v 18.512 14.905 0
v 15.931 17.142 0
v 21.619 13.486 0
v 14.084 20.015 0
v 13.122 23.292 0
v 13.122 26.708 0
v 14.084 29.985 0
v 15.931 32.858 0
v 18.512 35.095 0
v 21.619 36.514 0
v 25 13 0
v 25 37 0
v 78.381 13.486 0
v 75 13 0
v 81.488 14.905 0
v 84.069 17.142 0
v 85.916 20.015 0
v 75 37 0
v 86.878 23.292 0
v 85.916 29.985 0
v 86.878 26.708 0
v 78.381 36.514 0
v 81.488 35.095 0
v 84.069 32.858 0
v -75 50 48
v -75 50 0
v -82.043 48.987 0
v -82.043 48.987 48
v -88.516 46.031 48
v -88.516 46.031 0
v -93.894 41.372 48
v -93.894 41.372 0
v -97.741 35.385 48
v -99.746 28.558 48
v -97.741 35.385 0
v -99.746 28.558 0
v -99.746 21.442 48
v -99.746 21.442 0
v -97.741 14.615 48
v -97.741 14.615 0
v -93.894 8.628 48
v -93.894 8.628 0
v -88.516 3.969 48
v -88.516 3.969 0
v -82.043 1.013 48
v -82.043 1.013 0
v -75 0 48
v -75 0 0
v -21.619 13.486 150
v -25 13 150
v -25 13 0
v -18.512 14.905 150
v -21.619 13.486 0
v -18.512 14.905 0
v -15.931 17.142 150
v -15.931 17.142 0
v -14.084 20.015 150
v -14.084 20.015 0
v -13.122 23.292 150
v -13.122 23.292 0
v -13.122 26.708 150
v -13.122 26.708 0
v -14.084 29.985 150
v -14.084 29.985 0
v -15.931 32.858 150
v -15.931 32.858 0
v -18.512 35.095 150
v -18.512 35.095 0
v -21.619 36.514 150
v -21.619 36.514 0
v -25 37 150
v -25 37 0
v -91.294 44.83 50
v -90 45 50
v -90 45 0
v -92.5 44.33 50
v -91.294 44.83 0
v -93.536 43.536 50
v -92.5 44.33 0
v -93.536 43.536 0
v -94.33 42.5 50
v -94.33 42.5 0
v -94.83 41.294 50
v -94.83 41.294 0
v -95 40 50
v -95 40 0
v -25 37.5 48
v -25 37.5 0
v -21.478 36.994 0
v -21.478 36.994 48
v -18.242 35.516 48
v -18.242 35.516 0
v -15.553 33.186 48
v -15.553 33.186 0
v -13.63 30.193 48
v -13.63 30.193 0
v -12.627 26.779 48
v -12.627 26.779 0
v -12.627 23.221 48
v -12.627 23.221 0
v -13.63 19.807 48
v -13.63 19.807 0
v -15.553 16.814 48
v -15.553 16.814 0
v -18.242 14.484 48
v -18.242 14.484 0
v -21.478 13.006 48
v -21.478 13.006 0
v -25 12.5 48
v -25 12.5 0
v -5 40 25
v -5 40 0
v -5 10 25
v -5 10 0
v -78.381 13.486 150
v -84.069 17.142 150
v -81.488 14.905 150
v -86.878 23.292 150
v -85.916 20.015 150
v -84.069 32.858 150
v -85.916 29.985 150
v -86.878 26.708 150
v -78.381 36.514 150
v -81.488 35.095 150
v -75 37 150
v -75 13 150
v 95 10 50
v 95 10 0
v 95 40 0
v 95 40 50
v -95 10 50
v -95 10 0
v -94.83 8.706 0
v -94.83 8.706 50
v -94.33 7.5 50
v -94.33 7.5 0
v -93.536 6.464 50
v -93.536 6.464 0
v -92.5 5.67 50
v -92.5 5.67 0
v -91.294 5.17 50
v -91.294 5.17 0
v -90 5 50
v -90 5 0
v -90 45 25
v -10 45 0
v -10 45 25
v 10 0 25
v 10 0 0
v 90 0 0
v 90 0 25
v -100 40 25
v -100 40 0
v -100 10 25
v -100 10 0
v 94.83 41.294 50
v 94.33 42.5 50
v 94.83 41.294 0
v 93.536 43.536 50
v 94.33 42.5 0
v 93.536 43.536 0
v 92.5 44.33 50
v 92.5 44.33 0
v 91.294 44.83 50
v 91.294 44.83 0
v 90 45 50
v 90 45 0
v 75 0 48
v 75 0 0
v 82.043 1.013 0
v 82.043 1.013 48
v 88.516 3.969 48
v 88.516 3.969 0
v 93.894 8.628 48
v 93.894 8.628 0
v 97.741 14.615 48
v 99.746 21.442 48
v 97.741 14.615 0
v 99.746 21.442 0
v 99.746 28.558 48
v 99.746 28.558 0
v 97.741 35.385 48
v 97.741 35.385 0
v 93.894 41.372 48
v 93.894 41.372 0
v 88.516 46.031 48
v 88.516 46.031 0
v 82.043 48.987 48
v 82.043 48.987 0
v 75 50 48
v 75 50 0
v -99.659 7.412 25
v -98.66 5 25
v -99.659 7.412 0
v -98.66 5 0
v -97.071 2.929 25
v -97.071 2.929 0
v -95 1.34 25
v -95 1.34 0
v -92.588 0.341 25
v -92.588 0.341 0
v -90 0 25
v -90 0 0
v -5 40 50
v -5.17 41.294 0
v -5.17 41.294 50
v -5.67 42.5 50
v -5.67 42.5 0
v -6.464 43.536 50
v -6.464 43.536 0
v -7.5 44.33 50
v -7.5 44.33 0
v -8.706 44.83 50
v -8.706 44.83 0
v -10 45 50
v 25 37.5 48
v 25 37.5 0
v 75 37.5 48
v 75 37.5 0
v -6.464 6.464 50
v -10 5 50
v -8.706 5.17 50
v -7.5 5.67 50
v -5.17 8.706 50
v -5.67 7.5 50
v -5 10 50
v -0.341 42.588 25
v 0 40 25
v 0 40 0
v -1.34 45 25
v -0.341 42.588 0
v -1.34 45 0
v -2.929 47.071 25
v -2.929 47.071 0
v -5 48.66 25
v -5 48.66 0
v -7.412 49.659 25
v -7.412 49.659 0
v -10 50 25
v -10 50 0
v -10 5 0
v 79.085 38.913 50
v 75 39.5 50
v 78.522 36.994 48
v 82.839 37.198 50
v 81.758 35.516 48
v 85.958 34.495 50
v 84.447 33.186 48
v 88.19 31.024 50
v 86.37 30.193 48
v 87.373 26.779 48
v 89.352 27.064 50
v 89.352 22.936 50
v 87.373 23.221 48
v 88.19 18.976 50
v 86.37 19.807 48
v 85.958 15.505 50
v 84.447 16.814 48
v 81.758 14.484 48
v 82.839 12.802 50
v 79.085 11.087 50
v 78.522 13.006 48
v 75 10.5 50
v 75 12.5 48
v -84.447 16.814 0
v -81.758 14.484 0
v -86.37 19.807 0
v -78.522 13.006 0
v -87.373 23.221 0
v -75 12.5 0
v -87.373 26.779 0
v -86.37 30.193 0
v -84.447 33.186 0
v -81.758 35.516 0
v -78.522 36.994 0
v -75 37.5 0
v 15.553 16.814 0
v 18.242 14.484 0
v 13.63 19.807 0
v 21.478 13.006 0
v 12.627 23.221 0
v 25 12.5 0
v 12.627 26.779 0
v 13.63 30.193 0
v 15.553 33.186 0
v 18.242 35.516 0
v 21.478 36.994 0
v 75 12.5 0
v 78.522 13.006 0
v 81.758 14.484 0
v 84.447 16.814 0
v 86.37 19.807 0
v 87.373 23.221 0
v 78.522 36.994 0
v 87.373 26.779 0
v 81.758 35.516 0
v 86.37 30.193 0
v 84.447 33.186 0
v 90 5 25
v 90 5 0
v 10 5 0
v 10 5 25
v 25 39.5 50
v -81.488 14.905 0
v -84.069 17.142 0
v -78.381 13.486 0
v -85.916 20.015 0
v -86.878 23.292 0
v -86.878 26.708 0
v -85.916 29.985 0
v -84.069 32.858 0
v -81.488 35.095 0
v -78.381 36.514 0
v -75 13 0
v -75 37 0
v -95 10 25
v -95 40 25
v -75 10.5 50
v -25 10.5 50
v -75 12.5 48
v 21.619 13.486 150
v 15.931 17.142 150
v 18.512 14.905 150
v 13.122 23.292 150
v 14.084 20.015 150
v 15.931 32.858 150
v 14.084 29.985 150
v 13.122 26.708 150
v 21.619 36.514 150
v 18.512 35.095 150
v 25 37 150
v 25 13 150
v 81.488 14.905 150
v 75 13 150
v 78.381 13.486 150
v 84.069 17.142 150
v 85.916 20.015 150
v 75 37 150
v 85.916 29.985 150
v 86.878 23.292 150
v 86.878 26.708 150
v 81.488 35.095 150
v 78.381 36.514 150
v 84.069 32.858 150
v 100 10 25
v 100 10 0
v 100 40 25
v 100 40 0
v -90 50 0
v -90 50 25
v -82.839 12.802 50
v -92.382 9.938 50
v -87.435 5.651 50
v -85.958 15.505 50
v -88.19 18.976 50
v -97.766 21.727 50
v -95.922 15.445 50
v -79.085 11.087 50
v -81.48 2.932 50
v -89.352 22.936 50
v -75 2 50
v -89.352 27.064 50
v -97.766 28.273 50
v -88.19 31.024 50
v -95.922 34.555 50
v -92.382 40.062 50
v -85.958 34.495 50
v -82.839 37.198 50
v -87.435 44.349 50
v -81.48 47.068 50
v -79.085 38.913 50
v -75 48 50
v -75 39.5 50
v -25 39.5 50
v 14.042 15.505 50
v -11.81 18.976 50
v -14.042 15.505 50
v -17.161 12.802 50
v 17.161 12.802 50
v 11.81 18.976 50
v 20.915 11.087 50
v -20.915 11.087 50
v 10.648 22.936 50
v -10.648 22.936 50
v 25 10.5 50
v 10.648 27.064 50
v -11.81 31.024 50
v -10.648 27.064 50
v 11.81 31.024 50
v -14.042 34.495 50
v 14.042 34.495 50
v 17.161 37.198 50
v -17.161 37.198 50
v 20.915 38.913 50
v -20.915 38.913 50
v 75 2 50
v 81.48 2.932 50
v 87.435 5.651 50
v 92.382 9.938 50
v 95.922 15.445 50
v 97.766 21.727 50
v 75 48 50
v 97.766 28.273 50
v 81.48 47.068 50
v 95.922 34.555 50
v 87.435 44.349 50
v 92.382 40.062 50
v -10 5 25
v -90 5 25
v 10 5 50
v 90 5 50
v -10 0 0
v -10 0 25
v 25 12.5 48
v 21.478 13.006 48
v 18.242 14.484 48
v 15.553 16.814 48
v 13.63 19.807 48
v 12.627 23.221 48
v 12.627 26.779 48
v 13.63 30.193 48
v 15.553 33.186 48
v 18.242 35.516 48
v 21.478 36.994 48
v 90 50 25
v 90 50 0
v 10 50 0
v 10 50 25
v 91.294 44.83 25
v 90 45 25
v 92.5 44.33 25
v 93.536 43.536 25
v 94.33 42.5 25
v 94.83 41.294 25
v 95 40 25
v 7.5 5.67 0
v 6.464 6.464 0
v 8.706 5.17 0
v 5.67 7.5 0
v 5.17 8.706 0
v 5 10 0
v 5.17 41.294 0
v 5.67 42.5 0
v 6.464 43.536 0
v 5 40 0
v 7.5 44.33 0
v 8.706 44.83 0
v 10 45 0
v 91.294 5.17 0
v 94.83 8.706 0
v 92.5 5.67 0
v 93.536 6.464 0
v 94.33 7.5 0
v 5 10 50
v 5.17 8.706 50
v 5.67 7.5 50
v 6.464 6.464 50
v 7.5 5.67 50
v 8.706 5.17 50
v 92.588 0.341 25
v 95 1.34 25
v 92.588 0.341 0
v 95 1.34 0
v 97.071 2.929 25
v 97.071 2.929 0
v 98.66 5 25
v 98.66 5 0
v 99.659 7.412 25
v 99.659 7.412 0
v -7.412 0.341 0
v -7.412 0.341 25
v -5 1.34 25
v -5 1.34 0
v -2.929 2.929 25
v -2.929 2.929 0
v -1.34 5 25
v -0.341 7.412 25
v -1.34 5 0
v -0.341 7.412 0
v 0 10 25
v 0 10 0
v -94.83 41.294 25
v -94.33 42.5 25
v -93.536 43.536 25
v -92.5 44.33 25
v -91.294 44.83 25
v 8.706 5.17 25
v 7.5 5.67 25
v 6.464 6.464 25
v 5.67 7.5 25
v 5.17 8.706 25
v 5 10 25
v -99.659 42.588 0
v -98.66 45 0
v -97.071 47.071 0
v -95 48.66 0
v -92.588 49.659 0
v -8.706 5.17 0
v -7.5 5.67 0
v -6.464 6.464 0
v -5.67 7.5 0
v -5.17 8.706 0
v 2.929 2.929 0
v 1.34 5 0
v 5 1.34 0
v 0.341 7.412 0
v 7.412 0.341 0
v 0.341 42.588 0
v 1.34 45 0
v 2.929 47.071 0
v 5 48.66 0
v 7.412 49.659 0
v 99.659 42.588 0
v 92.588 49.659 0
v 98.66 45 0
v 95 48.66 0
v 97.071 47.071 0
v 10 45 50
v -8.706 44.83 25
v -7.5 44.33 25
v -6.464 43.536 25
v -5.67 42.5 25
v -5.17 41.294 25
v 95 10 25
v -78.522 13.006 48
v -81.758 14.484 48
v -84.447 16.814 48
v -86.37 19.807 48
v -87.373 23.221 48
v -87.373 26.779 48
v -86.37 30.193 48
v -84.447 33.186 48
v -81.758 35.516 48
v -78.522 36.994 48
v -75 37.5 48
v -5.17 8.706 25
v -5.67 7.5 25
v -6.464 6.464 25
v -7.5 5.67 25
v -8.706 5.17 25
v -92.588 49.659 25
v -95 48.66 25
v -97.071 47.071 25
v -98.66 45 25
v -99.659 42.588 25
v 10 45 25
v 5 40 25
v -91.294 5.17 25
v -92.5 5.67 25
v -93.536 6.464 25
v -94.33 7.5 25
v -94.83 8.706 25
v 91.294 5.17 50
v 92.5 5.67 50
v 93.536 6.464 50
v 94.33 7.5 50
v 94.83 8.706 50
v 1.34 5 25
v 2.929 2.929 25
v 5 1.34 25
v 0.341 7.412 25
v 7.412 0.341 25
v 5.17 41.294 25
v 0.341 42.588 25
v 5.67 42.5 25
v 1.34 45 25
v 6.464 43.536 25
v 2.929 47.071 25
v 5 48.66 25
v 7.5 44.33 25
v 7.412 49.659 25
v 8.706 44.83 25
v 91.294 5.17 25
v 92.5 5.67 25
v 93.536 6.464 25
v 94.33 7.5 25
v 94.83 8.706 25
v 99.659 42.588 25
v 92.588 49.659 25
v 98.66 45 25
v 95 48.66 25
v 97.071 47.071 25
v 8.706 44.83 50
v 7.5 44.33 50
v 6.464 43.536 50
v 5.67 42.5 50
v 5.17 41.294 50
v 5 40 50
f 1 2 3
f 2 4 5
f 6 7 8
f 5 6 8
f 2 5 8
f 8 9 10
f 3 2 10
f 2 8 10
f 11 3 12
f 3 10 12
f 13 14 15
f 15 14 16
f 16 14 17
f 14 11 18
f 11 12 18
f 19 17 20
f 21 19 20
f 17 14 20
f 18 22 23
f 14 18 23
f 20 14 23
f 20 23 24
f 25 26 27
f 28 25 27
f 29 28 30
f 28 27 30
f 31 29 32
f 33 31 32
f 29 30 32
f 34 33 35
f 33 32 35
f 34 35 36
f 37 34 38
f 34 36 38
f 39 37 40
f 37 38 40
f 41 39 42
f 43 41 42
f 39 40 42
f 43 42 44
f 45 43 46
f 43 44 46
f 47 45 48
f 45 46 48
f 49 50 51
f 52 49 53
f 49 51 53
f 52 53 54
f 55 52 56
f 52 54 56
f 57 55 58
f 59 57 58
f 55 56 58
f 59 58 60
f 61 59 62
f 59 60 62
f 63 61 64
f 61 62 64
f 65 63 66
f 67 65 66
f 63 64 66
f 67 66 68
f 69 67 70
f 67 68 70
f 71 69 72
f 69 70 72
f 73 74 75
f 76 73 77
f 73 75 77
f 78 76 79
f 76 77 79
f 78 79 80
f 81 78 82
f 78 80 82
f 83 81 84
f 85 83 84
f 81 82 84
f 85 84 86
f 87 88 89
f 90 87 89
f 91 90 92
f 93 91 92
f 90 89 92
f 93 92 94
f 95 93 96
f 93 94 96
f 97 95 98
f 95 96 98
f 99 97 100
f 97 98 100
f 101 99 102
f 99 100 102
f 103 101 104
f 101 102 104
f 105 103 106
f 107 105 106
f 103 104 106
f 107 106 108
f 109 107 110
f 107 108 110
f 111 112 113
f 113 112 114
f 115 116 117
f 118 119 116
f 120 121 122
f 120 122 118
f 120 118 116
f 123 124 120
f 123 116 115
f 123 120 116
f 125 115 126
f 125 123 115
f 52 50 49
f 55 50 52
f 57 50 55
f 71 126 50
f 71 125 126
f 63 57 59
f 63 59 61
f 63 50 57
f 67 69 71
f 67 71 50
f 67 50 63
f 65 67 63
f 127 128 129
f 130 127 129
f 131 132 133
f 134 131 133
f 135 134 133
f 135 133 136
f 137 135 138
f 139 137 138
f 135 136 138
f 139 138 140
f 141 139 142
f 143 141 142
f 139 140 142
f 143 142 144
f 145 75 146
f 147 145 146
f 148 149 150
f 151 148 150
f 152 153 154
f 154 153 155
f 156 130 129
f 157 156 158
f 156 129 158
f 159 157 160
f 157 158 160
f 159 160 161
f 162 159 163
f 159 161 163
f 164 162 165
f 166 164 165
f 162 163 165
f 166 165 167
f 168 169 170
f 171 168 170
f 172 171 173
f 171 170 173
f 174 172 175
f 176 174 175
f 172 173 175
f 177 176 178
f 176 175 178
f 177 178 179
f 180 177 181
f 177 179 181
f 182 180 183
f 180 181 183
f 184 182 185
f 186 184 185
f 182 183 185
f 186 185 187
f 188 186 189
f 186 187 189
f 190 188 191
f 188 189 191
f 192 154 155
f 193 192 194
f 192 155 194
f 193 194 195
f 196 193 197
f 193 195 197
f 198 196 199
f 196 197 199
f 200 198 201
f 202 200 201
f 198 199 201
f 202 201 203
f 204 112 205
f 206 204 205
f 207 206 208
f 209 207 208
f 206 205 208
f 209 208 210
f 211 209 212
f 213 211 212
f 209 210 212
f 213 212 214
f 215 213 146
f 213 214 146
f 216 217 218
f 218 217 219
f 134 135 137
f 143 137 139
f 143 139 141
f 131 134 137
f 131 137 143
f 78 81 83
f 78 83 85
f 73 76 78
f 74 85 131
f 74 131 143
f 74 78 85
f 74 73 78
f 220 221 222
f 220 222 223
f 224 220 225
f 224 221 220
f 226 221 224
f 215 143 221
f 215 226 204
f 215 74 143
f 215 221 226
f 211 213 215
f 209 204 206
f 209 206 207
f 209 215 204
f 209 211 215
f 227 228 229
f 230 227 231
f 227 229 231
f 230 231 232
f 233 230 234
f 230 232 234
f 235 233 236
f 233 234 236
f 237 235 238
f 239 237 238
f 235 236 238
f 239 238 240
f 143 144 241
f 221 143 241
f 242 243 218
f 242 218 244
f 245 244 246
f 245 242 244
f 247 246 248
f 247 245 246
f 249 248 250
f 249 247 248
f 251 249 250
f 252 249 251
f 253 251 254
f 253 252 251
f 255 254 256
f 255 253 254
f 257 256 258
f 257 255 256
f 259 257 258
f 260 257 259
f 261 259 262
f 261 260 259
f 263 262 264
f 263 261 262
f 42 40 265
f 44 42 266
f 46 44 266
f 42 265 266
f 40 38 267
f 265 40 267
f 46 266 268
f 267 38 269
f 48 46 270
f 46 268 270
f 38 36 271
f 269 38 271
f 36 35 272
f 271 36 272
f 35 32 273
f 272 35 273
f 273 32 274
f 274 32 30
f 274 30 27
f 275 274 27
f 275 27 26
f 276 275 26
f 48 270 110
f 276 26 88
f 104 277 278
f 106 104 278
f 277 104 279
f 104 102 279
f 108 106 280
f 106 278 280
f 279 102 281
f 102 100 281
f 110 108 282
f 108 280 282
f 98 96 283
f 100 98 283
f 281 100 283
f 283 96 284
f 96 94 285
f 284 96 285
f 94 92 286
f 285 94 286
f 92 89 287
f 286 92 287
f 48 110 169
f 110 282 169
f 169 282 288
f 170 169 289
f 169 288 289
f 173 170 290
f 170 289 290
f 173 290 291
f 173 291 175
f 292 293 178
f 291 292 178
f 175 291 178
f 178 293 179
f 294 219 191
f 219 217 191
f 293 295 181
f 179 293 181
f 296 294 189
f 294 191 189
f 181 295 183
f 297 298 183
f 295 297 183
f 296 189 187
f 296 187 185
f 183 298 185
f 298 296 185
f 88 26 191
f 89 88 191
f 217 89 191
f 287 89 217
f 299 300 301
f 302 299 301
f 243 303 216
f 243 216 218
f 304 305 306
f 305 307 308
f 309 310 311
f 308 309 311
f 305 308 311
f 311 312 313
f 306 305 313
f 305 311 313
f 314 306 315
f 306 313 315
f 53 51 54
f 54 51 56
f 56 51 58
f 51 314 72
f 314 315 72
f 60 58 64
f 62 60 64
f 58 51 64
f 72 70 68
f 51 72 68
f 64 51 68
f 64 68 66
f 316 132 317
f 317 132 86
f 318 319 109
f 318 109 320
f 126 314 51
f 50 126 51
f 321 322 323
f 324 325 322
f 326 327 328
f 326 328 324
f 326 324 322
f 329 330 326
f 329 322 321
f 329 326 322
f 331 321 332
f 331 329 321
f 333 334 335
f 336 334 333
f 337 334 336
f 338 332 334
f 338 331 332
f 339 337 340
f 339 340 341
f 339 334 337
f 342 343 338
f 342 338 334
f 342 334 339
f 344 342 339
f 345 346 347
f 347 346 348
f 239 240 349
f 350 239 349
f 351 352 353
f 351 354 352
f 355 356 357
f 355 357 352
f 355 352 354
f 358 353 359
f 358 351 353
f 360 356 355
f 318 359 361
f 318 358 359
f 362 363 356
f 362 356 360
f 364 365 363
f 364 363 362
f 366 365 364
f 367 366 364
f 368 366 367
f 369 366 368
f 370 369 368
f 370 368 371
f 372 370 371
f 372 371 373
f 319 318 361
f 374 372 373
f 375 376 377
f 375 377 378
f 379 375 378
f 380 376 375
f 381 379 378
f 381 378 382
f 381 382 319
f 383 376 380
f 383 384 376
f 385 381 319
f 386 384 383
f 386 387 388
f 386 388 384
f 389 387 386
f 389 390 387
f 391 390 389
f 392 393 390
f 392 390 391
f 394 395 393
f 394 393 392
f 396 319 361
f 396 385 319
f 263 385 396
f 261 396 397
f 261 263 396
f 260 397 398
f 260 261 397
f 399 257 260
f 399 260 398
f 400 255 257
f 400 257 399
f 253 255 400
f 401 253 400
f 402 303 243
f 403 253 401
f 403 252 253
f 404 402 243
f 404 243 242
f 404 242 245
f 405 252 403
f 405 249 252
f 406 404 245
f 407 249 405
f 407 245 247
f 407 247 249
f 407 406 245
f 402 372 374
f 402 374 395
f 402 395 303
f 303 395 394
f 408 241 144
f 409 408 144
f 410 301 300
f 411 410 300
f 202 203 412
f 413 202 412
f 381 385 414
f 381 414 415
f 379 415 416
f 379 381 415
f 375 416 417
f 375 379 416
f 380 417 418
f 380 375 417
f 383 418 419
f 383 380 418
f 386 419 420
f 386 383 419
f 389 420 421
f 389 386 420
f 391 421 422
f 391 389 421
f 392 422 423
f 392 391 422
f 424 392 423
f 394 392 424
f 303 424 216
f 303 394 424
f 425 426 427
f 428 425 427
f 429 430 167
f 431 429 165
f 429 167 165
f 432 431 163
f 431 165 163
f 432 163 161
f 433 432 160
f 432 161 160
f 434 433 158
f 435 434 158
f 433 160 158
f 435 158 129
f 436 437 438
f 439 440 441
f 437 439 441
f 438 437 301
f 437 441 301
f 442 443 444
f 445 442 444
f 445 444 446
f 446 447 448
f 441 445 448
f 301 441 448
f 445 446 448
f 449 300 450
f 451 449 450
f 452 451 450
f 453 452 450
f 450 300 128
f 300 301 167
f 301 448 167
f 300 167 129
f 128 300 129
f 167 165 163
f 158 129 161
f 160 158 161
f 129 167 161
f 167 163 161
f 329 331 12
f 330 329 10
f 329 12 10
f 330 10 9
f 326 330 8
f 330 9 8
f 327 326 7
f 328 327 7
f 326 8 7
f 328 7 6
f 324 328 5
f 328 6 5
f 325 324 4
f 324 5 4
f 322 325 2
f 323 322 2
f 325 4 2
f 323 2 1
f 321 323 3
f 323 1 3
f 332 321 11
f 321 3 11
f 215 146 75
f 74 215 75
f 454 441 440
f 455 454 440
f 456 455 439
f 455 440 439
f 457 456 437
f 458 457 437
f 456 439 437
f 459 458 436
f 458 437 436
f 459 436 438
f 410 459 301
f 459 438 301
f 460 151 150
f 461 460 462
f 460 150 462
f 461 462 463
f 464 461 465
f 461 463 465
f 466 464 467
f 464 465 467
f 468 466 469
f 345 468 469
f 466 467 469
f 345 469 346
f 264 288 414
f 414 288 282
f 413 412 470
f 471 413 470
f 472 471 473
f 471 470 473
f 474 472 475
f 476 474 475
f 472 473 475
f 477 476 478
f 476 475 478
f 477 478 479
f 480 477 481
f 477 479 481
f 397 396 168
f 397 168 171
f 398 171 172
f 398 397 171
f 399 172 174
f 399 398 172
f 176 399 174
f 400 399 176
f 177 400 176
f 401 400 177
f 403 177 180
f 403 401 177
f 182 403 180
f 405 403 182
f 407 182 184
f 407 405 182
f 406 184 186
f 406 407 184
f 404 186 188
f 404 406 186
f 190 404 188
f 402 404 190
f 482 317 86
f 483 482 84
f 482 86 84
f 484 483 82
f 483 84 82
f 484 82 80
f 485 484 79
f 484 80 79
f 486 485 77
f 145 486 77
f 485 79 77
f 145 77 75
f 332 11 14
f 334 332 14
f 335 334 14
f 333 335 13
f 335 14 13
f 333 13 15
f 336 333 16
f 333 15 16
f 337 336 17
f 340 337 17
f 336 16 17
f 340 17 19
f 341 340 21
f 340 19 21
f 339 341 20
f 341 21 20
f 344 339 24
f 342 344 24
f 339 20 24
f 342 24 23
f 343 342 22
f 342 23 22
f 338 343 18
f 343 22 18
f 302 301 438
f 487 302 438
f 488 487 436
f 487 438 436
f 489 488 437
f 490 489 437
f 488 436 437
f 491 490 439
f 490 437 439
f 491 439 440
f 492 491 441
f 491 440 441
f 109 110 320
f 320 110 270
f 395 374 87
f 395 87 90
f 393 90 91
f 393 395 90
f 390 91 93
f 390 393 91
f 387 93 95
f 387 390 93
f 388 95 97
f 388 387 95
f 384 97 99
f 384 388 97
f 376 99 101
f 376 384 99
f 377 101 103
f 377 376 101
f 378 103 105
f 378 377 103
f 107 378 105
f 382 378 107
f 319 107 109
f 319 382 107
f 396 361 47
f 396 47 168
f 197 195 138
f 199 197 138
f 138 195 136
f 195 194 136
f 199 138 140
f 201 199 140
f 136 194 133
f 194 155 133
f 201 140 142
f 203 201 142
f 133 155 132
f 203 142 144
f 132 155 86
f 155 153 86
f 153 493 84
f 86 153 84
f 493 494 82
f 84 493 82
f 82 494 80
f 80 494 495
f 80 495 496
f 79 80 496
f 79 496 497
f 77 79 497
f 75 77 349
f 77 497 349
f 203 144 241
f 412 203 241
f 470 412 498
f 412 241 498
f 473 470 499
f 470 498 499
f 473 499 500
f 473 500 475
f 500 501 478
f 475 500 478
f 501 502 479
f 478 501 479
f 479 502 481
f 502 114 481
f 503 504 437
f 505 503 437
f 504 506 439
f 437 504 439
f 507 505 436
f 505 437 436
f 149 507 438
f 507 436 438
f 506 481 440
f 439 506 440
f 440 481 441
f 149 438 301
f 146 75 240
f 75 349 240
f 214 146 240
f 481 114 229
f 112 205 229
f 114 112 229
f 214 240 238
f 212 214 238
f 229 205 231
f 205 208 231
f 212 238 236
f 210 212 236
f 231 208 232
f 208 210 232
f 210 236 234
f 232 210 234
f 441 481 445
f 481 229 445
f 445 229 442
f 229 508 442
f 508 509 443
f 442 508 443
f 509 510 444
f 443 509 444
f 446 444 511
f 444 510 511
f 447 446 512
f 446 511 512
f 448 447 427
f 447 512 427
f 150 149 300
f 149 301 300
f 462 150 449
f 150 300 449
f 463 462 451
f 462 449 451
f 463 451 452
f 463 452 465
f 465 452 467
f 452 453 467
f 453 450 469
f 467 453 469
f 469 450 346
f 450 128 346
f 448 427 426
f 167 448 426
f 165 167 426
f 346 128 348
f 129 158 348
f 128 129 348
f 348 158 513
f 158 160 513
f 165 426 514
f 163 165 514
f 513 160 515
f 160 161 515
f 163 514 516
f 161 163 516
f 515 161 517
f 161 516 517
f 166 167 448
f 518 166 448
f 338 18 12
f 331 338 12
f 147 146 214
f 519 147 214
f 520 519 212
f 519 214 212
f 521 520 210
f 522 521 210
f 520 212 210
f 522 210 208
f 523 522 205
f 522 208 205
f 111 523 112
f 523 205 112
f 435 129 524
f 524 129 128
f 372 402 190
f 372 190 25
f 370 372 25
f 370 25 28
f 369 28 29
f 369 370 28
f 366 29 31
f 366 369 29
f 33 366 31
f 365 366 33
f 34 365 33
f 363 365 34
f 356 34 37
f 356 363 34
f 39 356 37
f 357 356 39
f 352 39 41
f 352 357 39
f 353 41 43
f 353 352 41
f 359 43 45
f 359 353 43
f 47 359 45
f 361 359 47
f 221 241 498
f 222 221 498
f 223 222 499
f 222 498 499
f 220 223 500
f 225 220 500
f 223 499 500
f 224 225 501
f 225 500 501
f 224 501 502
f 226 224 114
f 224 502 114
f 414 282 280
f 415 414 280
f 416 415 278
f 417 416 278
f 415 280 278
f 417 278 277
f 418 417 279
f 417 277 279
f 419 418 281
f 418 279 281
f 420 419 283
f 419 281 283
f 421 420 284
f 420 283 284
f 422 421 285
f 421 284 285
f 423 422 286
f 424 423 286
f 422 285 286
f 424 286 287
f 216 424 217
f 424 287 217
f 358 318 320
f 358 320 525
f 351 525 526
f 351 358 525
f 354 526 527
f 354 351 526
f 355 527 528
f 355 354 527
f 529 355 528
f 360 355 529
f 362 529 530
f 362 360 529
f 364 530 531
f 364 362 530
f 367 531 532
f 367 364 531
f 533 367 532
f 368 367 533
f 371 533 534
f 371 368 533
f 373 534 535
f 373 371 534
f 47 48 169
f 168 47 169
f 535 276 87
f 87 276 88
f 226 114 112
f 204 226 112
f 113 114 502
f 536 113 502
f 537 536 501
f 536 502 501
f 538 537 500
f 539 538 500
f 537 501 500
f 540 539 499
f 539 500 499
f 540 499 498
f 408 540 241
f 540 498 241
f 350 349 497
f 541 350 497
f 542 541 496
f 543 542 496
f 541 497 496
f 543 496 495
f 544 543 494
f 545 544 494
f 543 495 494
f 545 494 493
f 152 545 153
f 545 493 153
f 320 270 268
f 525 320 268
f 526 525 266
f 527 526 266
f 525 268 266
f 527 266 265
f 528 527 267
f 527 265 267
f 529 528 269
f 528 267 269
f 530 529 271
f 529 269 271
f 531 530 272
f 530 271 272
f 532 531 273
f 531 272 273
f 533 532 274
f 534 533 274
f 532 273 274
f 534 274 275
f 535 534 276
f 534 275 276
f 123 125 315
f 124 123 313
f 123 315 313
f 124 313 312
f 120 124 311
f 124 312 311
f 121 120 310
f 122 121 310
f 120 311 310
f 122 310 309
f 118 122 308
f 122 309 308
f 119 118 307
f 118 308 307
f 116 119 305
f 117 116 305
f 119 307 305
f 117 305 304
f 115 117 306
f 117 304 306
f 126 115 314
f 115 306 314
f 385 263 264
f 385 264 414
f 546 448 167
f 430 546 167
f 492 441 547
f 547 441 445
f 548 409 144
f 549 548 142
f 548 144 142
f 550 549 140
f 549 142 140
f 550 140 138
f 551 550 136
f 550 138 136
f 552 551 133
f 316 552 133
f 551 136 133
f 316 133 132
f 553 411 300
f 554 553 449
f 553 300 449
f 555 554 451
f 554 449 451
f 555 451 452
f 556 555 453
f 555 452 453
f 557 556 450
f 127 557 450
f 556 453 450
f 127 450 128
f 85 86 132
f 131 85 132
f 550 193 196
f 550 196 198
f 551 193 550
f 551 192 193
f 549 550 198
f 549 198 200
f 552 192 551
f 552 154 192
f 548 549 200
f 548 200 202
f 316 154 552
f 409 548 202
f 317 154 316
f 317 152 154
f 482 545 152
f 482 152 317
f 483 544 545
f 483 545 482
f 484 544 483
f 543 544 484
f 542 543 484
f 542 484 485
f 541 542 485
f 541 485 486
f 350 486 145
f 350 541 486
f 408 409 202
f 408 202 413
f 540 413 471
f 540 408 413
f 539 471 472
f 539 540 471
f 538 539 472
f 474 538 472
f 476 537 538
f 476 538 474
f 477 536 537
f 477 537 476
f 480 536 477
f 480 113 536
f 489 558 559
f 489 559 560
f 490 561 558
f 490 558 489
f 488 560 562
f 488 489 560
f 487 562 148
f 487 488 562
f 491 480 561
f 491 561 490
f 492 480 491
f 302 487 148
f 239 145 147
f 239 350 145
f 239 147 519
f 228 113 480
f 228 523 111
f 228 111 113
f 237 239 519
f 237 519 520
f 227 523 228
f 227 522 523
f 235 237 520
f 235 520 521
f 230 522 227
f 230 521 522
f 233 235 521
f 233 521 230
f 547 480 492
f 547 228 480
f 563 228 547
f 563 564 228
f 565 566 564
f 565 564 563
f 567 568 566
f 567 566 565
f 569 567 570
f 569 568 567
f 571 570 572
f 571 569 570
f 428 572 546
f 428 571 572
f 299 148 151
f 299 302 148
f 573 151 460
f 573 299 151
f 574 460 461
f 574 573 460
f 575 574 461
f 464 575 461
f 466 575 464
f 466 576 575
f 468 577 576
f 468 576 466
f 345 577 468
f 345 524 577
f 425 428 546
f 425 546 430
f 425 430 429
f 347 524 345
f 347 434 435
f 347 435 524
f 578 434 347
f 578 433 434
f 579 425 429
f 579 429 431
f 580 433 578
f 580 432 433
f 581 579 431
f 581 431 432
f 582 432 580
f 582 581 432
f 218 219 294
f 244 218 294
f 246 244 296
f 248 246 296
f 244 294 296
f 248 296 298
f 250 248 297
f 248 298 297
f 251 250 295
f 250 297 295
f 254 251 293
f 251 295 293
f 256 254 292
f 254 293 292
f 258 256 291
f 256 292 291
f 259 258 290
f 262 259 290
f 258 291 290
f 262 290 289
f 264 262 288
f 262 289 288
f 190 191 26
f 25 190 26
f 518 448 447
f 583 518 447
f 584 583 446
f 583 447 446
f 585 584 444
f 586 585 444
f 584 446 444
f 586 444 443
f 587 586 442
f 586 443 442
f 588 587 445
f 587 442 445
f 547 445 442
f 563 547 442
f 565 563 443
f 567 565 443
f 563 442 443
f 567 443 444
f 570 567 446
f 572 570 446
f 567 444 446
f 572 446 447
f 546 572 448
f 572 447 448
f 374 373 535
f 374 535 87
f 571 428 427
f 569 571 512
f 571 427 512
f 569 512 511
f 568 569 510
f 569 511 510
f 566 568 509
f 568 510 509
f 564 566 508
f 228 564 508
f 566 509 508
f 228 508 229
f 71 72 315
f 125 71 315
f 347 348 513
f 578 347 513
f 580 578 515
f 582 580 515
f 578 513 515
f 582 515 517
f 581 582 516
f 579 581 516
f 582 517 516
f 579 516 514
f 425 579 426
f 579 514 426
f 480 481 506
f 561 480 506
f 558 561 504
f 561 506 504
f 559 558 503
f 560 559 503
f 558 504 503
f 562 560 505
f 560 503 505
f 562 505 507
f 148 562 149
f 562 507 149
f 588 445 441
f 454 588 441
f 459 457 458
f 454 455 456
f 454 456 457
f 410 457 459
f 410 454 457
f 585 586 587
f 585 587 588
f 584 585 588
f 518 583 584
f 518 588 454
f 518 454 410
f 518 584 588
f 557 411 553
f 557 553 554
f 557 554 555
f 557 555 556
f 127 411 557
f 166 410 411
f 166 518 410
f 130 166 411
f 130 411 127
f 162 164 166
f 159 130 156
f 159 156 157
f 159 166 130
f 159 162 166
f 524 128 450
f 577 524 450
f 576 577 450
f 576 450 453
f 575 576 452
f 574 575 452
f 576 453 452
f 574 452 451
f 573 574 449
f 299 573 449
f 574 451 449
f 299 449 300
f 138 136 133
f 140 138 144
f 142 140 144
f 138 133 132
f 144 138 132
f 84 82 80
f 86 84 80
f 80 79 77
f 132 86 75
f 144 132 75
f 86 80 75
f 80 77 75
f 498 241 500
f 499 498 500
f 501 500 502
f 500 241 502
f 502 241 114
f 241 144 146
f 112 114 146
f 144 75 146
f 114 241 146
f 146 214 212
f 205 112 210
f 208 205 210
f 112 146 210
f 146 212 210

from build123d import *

# Parameters (mm, degrees)
F1_DEPTH = 50
F2_SIZE  = 2
F4_DEPTH = 150
F6_DEPTH = 25
F7_DEPTH = 50


with BuildPart() as f1:
    # F0 (on Top) → F1 (new body)
    with BuildSketch(Plane.XY):
        with BuildLine():
            Line((75, 12.5), (75, 0))
            ThreePointArc((75, 0), (100, 25), (75, 50))
            Line((75, 50), (75, 37.5))
            ThreePointArc((75, 37.5), (87.5, 25), (75, 12.5))
        make_face()
        with BuildLine():
            Line((-75, 0), (75, 0))
            Line((75, 0), (75, 12.5))
            Line((75, 12.5), (25, 12.5))
            ThreePointArc((25, 12.5), (12.5, 25), (25, 37.5))
            Line((25, 37.5), (75, 37.5))
            Line((75, 37.5), (75, 50))
            Line((75, 50), (-75, 50))
            Line((-75, 50), (-75, 37.5))
            Line((-75, 37.5), (-25, 37.5))
            ThreePointArc((-25, 37.5), (-12.5, 25), (-25, 12.5))
            Line((-25, 12.5), (-75, 12.5))
            Line((-75, 12.5), (-75, 0))
        make_face()
        with BuildLine():
            ThreePointArc((-75, 50), (-100, 25), (-75, 0))
            Line((-75, 0), (-75, 12.5))
            ThreePointArc((-75, 12.5), (-87.5, 25), (-75, 37.5))
            Line((-75, 37.5), (-75, 50))
        make_face()
    extrude(amount=F1_DEPTH)

    # F2
    f2_edges = [f1.edges().sort_by_distance(p)[0] for p in [
        (0, 0, 50),
        (12.5, 25, 50),
        (-50, 12.5, 50),
    ]]
    chamfer(f2_edges, length=F2_SIZE)


with BuildPart() as f4:
    # F3 (on Top) → F4 (new body)
    with BuildSketch(Plane.XY):
        with BuildLine():
            ThreePointArc((-25, 13), (-13, 25), (-25, 37))
            Line((-25, 37), (-75, 37))
            ThreePointArc((-75, 37), (-87, 25), (-75, 13))
            Line((-75, 13), (-25, 13))
        make_face()
        with BuildLine():
            ThreePointArc((25, 37), (13, 25), (25, 13))
            Line((25, 13), (75, 13))
            ThreePointArc((75, 13), (87, 25), (75, 37))
            Line((75, 37), (25, 37))
        make_face()
    extrude(amount=F4_DEPTH)


with BuildPart() as f6:
    # F5 (on Top) → F6 (new body)
    with BuildSketch(Plane.XY):
        with BuildLine():
            ThreePointArc((0, 10), (2.928932, 2.928932), (10, 0))
            Line((10, 0), (90, 0))
            ThreePointArc((90, 0), (97.071068, 2.928932), (100, 10))
            Line((100, 10), (100, 40))
            ThreePointArc((100, 40), (97.071068, 47.071068), (90, 50))
            Line((90, 50), (10, 50))
            ThreePointArc((10, 50), (2.928932, 47.071068), (0, 40))
            Line((0, 40), (0, 10))
        make_face()
        with BuildLine():
            ThreePointArc((90, 45), (93.535534, 43.535534), (95, 40))
            Line((95, 40), (95, 10))
            ThreePointArc((95, 10), (93.535534, 6.464466), (90, 5))
            Line((90, 5), (10, 5))
            ThreePointArc((10, 5), (6.464466, 6.464466), (5, 10))
            Line((5, 10), (5, 40))
            ThreePointArc((5, 40), (6.464466, 43.535534), (10, 45))
            Line((10, 45), (90, 45))
        make_face(mode=Mode.SUBTRACT)
        with BuildLine():
            ThreePointArc((-10, 0), (-2.928932, 2.928932), (0, 10))
            Line((0, 10), (0, 40))
            ThreePointArc((0, 40), (-2.928932, 47.071068), (-10, 50))
            Line((-10, 50), (-90, 50))
            ThreePointArc((-90, 50), (-97.071068, 47.071068), (-100, 40))
            Line((-100, 40), (-100, 10))
            ThreePointArc((-100, 10), (-97.071068, 2.928932), (-90, 0))
            Line((-90, 0), (-10, 0))
        make_face()
        with BuildLine():
            Line((-95, 10), (-95, 40))
            ThreePointArc((-95, 40), (-93.535534, 43.535534), (-90, 45))
            Line((-90, 45), (-10, 45))
            ThreePointArc((-10, 45), (-6.464466, 43.535534), (-5, 40))
            Line((-5, 40), (-5, 10))
            ThreePointArc((-5, 10), (-6.464466, 6.464466), (-10, 5))
            Line((-10, 5), (-90, 5))
            ThreePointArc((-90, 5), (-93.535534, 6.464466), (-95, 10))
        make_face(mode=Mode.SUBTRACT)
    extrude(amount=F6_DEPTH)


with BuildPart() as f7:
    # F5 (on Top) → F7 (new body)
    with BuildSketch(Plane.XY):
        with BuildLine():
            Line((95, 10), (95, 40))
            ThreePointArc((95, 40), (93.535534, 43.535534), (90, 45))
            Line((90, 45), (10, 45))
            ThreePointArc((10, 45), (6.464466, 43.535534), (5, 40))
            Line((5, 40), (5, 10))
            ThreePointArc((5, 10), (6.464466, 6.464466), (10, 5))
            Line((10, 5), (90, 5))
            ThreePointArc((90, 5), (93.535534, 6.464466), (95, 10))
        make_face()
        with BuildLine():
            ThreePointArc((-90, 45), (-93.535534, 43.535534), (-95, 40))
            Line((-95, 40), (-95, 10))
            ThreePointArc((-95, 10), (-93.535534, 6.464466), (-90, 5))
            Line((-90, 5), (-10, 5))
            ThreePointArc((-10, 5), (-6.464466, 6.464466), (-5, 10))
            Line((-5, 10), (-5, 40))
            ThreePointArc((-5, 40), (-6.464466, 43.535534), (-10, 45))
            Line((-10, 45), (-90, 45))
        make_face()
    extrude(amount=F7_DEPTH)


solid = Compound([f1.part, f4.part, f6.part, f7.part])
